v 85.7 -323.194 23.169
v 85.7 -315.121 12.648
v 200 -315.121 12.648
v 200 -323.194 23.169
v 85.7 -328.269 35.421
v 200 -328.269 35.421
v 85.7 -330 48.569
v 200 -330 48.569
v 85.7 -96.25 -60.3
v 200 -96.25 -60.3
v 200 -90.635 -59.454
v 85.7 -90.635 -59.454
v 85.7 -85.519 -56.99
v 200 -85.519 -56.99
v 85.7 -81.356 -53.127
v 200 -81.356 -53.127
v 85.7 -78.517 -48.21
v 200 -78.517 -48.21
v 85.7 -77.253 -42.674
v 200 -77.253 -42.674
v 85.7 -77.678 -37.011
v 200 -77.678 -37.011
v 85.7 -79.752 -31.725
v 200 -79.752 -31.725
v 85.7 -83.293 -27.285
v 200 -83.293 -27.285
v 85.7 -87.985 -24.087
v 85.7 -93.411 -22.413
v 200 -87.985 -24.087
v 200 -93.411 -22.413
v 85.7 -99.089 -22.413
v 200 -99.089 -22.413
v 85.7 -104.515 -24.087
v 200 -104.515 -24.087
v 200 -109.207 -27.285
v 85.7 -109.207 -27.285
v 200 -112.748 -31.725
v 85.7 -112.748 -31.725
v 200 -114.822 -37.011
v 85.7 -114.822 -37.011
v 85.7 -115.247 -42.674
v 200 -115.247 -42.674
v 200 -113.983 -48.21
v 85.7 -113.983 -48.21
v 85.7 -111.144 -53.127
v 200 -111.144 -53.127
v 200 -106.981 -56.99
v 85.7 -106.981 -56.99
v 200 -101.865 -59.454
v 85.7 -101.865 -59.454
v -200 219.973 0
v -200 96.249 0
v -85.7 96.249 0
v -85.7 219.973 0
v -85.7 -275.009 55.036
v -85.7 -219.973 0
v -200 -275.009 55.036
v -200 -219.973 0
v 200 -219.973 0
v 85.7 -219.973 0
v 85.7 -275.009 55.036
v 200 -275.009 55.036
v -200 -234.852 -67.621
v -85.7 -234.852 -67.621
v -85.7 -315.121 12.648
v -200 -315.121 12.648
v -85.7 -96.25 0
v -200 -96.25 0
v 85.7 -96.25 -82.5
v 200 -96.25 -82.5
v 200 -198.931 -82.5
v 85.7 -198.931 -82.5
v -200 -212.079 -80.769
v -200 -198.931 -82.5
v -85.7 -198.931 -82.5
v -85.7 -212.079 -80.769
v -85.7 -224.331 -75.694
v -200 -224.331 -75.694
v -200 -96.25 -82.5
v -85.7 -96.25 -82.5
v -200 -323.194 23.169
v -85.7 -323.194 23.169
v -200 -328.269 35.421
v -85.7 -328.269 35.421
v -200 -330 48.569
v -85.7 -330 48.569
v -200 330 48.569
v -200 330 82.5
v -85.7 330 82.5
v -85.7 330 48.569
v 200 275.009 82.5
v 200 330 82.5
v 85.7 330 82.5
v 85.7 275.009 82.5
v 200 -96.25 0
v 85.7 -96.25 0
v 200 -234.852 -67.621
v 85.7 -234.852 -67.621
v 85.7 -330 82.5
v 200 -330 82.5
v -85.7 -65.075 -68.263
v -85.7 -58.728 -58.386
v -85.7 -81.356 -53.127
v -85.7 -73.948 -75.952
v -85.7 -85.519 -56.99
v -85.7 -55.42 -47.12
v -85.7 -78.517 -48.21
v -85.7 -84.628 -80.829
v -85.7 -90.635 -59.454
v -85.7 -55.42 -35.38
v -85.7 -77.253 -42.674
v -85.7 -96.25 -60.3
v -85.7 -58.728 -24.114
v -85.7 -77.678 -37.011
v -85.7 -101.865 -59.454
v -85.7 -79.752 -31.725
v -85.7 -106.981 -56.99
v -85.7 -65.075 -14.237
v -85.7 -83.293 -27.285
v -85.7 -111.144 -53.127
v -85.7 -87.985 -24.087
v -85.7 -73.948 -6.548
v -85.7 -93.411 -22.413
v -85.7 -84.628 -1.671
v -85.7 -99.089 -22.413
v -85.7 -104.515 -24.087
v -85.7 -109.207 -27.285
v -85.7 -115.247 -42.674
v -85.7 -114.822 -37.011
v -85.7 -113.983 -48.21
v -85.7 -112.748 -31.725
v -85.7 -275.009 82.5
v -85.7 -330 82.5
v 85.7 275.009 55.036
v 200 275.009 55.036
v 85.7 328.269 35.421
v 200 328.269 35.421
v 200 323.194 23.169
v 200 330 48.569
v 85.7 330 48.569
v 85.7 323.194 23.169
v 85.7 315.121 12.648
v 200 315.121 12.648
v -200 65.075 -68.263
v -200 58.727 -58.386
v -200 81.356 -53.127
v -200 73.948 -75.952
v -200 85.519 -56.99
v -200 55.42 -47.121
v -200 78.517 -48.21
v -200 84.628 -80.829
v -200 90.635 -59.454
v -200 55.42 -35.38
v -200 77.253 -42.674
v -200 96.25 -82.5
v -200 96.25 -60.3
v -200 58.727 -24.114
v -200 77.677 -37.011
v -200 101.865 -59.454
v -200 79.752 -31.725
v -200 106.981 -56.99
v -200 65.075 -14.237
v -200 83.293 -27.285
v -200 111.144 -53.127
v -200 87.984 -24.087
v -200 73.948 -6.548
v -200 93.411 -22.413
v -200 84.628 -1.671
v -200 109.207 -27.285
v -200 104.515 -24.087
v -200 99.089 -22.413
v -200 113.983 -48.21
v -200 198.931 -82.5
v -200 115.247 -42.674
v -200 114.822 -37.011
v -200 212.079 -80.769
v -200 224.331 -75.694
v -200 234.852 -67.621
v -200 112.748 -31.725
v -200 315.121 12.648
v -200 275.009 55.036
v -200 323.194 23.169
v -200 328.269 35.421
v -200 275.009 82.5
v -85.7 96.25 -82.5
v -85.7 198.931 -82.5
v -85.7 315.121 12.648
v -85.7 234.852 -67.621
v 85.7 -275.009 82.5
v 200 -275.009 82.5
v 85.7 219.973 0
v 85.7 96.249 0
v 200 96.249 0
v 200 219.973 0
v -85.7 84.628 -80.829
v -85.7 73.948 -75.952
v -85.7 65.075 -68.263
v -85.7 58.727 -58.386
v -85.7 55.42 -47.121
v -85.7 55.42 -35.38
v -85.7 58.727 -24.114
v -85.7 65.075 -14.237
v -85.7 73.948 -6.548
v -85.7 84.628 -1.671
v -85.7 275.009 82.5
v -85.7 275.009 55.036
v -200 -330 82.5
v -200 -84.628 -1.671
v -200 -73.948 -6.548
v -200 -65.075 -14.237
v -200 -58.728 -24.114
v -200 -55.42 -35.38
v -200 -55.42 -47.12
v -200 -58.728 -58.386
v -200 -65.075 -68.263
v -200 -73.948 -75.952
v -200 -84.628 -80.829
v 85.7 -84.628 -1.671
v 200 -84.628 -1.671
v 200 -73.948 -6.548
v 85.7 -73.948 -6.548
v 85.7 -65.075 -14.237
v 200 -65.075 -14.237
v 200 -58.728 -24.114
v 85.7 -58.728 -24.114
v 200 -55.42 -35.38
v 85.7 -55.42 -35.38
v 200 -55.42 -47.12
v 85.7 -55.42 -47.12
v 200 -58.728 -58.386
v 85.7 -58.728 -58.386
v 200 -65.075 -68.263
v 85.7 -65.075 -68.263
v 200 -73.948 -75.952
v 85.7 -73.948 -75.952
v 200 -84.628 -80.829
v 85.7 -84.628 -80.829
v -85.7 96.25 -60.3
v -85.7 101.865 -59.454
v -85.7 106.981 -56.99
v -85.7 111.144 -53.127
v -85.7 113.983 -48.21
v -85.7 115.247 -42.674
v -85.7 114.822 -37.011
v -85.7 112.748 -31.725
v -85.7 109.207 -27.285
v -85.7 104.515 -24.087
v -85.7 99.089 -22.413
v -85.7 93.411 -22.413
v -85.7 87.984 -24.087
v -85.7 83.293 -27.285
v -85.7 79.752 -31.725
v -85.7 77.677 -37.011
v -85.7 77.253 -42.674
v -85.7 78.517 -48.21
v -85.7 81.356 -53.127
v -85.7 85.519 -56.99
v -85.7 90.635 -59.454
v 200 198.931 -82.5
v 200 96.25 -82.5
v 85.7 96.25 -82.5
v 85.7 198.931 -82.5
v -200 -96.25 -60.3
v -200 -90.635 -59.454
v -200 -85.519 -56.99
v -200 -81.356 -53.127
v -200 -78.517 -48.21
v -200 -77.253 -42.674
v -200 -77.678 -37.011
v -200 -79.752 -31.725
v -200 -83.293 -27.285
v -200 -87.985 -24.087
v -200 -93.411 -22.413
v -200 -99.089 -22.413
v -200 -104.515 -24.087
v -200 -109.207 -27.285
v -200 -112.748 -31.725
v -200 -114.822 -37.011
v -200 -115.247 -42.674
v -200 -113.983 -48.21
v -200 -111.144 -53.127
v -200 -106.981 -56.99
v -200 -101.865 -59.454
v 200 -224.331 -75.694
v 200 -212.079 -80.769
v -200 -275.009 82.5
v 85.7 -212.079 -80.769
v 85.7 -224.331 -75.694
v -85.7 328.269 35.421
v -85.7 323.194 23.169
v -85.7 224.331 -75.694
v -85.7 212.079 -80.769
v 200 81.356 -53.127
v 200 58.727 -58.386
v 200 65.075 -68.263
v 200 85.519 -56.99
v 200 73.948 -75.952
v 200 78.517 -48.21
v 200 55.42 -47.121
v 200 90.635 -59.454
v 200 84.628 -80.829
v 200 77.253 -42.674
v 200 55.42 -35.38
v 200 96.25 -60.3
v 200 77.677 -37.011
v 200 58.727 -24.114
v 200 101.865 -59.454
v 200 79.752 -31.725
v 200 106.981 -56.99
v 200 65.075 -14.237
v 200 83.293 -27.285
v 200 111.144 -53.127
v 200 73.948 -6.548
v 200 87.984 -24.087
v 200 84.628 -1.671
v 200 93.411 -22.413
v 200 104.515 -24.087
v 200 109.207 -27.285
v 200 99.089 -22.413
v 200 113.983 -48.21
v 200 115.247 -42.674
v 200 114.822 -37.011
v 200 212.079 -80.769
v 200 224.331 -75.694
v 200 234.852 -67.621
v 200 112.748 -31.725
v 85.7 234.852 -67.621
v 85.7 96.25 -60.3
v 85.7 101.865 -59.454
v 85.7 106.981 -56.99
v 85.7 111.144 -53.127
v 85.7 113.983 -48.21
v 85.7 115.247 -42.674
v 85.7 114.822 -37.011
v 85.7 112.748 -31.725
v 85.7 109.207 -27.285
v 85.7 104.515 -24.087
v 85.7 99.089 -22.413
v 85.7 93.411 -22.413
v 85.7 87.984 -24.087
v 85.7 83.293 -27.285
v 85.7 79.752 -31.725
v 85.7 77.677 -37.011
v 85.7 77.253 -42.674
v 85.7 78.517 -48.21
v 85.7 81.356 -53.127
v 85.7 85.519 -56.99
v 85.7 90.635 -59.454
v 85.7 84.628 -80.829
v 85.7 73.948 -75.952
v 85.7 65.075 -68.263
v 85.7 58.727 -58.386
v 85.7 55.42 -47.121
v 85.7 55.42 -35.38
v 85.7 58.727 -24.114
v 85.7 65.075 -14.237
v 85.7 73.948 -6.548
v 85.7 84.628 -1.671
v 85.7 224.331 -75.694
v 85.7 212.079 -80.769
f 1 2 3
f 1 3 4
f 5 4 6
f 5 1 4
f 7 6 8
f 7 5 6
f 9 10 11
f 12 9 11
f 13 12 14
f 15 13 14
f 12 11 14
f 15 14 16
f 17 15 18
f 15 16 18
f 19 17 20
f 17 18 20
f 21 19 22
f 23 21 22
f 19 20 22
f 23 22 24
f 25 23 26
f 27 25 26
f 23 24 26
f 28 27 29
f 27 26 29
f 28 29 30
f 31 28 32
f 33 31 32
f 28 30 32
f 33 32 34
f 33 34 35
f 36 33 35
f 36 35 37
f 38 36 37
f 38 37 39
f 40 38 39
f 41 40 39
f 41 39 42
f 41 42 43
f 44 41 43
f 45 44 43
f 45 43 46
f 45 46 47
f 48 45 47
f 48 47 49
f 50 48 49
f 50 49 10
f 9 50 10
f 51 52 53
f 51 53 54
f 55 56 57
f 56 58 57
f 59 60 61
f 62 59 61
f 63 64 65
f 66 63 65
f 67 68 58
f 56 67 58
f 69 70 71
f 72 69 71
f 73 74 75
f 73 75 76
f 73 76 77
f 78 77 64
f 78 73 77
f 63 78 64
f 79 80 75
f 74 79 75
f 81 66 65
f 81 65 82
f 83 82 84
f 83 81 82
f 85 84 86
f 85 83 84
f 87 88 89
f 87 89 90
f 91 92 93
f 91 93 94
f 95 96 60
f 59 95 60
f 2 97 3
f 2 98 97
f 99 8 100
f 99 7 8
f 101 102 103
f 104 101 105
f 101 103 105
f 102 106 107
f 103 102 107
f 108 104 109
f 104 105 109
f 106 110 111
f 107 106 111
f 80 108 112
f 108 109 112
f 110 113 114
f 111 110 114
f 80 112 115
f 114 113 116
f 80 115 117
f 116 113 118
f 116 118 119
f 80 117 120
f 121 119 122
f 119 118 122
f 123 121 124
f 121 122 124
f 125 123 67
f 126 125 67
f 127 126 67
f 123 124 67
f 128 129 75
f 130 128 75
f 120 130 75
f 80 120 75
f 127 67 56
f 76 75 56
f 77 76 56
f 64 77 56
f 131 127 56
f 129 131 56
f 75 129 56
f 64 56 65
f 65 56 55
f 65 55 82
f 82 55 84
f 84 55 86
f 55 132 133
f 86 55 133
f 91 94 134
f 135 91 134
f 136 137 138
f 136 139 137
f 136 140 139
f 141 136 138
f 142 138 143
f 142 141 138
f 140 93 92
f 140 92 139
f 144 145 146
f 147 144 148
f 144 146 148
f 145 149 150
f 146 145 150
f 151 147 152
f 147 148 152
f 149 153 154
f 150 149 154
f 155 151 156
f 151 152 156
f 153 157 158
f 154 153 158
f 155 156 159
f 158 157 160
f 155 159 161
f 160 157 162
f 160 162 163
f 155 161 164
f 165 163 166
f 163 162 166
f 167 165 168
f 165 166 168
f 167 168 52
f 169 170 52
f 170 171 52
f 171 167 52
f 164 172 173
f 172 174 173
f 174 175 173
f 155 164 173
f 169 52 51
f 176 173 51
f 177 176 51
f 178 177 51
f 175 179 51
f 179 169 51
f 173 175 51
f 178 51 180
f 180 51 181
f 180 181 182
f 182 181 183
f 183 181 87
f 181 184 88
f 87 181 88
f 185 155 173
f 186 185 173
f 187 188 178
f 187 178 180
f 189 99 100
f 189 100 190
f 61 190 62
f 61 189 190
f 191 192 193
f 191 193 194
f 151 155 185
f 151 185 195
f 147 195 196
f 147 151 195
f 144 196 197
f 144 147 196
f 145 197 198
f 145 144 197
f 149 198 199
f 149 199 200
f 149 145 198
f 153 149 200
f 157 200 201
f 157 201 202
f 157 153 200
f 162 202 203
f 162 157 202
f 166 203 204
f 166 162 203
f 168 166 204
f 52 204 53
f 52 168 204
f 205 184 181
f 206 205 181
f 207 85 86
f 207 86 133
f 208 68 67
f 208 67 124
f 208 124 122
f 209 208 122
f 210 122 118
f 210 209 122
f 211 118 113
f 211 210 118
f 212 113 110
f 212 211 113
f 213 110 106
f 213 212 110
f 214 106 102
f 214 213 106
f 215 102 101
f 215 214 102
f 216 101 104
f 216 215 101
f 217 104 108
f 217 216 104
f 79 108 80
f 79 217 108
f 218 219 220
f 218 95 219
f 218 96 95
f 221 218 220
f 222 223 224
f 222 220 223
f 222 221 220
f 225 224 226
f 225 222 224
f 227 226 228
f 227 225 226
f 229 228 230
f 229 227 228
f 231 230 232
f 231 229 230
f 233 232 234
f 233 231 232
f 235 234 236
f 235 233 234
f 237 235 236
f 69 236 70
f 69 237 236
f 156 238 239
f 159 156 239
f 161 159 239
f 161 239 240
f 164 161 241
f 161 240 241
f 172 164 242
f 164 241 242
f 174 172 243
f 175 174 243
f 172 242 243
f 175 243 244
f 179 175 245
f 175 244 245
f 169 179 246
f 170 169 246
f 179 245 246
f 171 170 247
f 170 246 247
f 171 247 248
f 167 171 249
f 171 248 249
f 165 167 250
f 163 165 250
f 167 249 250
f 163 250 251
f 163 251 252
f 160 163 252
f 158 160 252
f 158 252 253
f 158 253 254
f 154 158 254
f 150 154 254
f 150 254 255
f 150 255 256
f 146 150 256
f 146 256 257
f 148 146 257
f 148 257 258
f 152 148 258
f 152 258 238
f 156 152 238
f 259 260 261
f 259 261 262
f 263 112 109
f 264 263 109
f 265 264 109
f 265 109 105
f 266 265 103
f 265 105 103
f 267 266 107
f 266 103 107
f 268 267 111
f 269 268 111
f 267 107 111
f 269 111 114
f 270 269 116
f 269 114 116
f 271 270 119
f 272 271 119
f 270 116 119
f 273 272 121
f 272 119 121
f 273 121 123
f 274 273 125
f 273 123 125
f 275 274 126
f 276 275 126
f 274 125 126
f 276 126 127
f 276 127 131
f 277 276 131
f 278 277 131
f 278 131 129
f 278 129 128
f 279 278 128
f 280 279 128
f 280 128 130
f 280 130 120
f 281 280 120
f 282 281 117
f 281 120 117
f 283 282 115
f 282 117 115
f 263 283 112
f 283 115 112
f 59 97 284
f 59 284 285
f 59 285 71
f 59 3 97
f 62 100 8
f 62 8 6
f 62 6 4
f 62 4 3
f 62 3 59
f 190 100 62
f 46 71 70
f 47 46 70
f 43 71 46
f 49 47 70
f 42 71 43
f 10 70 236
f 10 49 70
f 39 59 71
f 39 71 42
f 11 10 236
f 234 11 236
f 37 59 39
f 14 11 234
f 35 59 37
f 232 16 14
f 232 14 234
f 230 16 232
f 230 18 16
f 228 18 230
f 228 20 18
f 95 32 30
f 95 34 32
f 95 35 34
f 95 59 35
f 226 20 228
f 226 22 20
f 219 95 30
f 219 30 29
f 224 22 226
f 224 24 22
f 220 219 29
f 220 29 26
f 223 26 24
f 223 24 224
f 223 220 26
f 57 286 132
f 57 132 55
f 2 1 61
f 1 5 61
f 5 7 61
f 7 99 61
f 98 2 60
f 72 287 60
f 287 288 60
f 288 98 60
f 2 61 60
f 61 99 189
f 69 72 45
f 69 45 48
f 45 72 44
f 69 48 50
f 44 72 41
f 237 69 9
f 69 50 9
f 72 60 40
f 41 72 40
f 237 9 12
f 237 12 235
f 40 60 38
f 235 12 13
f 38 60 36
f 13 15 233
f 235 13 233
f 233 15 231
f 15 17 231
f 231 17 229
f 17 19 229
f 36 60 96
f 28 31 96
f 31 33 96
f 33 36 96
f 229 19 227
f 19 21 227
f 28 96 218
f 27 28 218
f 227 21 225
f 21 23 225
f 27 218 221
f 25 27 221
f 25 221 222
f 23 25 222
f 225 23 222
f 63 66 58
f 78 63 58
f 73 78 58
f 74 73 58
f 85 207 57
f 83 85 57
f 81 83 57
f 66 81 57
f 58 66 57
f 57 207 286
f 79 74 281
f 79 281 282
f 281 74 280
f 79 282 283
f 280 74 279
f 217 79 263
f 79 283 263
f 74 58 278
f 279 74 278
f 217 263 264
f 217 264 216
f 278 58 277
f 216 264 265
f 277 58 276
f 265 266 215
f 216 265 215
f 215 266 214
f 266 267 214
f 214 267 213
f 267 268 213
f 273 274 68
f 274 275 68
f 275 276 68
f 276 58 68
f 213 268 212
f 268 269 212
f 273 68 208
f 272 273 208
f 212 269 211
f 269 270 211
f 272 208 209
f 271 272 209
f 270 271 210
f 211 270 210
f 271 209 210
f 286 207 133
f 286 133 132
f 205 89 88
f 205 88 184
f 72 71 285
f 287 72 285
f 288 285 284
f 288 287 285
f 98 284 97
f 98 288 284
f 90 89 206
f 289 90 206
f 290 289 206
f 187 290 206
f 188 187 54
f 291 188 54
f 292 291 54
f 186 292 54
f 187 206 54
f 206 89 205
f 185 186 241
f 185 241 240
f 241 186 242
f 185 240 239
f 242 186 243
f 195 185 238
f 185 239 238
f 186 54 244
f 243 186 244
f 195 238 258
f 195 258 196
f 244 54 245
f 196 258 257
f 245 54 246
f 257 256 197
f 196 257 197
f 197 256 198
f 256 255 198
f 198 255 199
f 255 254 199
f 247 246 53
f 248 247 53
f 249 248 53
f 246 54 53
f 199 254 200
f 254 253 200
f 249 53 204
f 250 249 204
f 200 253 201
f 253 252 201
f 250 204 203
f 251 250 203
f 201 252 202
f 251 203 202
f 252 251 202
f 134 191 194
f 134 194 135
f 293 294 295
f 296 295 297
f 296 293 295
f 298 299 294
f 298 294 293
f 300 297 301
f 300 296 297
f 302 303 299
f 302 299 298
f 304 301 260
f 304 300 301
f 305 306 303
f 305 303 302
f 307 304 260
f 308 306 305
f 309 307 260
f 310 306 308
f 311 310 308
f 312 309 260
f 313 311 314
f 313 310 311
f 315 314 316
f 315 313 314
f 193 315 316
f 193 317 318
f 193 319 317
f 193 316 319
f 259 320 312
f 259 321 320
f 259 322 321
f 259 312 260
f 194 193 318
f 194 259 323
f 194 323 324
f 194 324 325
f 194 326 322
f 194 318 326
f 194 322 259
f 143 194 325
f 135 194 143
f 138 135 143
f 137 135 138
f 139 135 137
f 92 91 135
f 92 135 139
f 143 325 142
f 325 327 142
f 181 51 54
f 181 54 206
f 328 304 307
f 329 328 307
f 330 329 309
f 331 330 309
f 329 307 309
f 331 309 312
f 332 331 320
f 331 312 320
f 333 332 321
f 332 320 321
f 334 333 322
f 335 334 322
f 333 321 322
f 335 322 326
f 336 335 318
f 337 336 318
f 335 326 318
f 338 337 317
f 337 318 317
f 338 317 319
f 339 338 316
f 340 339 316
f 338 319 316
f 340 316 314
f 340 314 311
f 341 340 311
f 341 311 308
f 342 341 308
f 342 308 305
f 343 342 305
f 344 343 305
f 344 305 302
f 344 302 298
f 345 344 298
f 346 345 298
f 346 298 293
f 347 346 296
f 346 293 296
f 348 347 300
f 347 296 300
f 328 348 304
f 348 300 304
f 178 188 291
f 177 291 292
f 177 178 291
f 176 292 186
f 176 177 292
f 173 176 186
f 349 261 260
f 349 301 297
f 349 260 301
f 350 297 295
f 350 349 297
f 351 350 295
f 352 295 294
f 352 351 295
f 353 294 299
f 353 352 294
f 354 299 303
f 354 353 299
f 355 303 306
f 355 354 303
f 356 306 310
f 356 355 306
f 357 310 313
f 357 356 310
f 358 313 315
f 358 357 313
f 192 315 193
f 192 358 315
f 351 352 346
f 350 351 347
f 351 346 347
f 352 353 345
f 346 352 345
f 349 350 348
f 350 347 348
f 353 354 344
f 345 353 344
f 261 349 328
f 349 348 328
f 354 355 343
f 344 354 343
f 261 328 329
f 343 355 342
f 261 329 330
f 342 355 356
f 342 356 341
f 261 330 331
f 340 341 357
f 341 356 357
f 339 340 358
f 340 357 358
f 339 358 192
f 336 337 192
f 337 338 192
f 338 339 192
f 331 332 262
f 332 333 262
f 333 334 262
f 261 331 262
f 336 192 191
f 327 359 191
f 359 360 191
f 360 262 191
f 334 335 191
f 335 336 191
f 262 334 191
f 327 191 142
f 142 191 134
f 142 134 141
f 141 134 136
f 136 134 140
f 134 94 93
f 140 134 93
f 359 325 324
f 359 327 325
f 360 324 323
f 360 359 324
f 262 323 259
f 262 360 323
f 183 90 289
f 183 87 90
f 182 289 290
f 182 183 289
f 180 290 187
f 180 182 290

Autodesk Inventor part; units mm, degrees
ref_plane "YZ Plane" through (0, 0, 0) normal (1, 0, 0) x (0, 1, 0)
ref_plane "XZ Plane" through (0, 0, 0) normal (0, 1, 0) x (-1, 0, 0)
ref_plane "XY Plane" through (0, 0, 0) normal (0, 0, 1) x (1, 0, 0)
sketch "Sketch1" plane through (0, 0, 0) normal (1, 0, 0) x (0, 1, 0)
  line L0 (330, 82.5) -> (330, 48.569)
  line L1 (-330, 48.569) -> (-330, 82.5)
  line L2 (96.2496, -82.5) -> (198.931, -82.5)
  line L3 (234.852, -67.621) -> (315.121, 12.648)
  line L4 (330, 82.5) -> (275.0088, 82.5)
  line L5 (275.0088, 82.5) -> (275.0088, 55.036)
  line L6 (96.2494, 0) -> (219.9728, 0)
  line L7 (219.9728, 0) -> (275.0088, 55.036)
  line L8 (-234.852, -67.621) -> (-315.121, 12.648)
  line L9 (-275.009, 82.5) -> (-275.009, 55.036)
  line L10 (-96.2496, 0) -> (-219.973, 0)
  line L11 (-219.973, 0) -> (-275.009, 55.036)
  line L12 (-330, 82.5) -> (-275.009, 82.5)
  line L13 (275.0088, 82.5) -> (330, 82.5)
  line L14 (198.931, -82.5) -> (96.25, -82.5)
  line L15 (-96.2496, -82.5) -> (-198.931, -82.5)
  arc A0 (-96.2496, -82.5) -> (-96.2496, 0) centre (-96.25, -41.25) ccw
  arc A1 (96.2494, 0) -> (96.2496, -82.5) centre (96.2498, -41.25) ccw
  arc A2 (-234.852, -67.621) -> (-198.931, -82.5) centre (-198.931, -31.7) ccw
  arc A3 (-330, 48.569) -> (-315.121, 12.648) centre (-279.2, 48.569) ccw
  arc A4 (198.931, -82.5) -> (234.852, -67.621) centre (198.931, -31.7) ccw
  arc A5 (315.121, 12.648) -> (330, 48.569) centre (279.2, 48.569) ccw
  point P0 (219.973, -82.5)
  point P1 (-219.973, -82.5)
  point P2 (330, 27.527)
  point P3 (-330, 27.527)
extrude "Extrusion1" add sketch "Sketch1" along normal mid plane 400
sketch "Sketch6" plane through (-200, 275.0088, 82.5) normal (0, 0, 1) x (1, 0, 0)
  line L0 (0, 0) -> (400, 0) projected
  line L1 (400, 54.9912) -> (0, 54.9912) projected
  line L2 (0, 0) -> (114.3, 0)
  line L3 (400, 54.9912) -> (285.7, 54.9912)
  line L4 (114.3, 0) -> (285.7, 0)
  line L5 (285.7, 0) -> (285.7, 54.9912)
  line L6 (285.7, 54.9912) -> (114.3, 54.9912)
  line L7 (114.3, 54.9912) -> (114.3, 0)
  line L8 (0, -605.6334) -> (114.3, -605.6334)
  line L9 (114.3, -605.6334) -> (285.7, -605.6334)
  line L10 (285.7, -605.6334) -> (285.7, 54.9912)
  line L11 (285.7, 54.9912) -> (114.3, 54.9912)
  line L12 (114.3, 54.9912) -> (114.3, -605.6334)
  point P0 (200, -275.0088)
  dimension "d39" = 114.3
  dimension "d40" = 114.3
  dimension "d41" = 114.3
extrude "Extrusion6" cut sketch "Sketch6" against normal blind 165
sketch "Sketch7" plane through (200, 0, 0) normal (1, 0, 0) x (0, 0, -1)
  arc A0 (0, 96.2494) -> (82.5, 96.2496) centre (41.25, 96.2498) ccw projected
  circle A1 centre (41.25, 96.2498) radius 19.05
  point P0 (0, 0)
  dimension "d48" = 38.1
sketch "Sketch8" plane through (200, 0, 0) normal (1, 0, 0) x (0, 0, -1)
  arc A0 (82.5, -96.2496) -> (0, -96.2496) centre (41.25, -96.25) ccw projected
  circle A1 centre (41.25, -96.25) radius 19.05
  point P0 (0, 0)
  dimension "d49" = 38.1
extrude "Extrusion7" cut sketch "Sketch7" against normal blind 400.05
extrude "Extrusion8" cut sketch "Sketch8" against normal blind 400.05
properties part number "Bastion Feet"
